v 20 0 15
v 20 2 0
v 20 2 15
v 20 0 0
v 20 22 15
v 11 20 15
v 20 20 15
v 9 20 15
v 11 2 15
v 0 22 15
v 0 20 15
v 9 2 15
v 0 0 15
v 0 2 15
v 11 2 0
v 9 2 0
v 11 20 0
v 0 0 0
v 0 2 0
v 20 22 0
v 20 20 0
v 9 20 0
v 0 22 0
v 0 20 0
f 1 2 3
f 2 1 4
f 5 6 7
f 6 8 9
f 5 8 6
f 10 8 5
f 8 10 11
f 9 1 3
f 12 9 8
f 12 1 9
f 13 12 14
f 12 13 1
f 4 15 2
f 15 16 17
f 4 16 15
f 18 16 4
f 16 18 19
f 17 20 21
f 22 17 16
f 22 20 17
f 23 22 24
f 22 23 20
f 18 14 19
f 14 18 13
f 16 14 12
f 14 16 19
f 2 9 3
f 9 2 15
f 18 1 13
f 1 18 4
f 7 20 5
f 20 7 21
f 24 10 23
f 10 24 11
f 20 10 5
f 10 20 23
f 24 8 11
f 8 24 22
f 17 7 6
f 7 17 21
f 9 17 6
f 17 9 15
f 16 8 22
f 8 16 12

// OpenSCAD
cube([20, 2, 15]);
translate([0, 20, 0]) cube([20, 2, 15]);
translate([9, 0, 0]) cube([2, 20, 15]);
